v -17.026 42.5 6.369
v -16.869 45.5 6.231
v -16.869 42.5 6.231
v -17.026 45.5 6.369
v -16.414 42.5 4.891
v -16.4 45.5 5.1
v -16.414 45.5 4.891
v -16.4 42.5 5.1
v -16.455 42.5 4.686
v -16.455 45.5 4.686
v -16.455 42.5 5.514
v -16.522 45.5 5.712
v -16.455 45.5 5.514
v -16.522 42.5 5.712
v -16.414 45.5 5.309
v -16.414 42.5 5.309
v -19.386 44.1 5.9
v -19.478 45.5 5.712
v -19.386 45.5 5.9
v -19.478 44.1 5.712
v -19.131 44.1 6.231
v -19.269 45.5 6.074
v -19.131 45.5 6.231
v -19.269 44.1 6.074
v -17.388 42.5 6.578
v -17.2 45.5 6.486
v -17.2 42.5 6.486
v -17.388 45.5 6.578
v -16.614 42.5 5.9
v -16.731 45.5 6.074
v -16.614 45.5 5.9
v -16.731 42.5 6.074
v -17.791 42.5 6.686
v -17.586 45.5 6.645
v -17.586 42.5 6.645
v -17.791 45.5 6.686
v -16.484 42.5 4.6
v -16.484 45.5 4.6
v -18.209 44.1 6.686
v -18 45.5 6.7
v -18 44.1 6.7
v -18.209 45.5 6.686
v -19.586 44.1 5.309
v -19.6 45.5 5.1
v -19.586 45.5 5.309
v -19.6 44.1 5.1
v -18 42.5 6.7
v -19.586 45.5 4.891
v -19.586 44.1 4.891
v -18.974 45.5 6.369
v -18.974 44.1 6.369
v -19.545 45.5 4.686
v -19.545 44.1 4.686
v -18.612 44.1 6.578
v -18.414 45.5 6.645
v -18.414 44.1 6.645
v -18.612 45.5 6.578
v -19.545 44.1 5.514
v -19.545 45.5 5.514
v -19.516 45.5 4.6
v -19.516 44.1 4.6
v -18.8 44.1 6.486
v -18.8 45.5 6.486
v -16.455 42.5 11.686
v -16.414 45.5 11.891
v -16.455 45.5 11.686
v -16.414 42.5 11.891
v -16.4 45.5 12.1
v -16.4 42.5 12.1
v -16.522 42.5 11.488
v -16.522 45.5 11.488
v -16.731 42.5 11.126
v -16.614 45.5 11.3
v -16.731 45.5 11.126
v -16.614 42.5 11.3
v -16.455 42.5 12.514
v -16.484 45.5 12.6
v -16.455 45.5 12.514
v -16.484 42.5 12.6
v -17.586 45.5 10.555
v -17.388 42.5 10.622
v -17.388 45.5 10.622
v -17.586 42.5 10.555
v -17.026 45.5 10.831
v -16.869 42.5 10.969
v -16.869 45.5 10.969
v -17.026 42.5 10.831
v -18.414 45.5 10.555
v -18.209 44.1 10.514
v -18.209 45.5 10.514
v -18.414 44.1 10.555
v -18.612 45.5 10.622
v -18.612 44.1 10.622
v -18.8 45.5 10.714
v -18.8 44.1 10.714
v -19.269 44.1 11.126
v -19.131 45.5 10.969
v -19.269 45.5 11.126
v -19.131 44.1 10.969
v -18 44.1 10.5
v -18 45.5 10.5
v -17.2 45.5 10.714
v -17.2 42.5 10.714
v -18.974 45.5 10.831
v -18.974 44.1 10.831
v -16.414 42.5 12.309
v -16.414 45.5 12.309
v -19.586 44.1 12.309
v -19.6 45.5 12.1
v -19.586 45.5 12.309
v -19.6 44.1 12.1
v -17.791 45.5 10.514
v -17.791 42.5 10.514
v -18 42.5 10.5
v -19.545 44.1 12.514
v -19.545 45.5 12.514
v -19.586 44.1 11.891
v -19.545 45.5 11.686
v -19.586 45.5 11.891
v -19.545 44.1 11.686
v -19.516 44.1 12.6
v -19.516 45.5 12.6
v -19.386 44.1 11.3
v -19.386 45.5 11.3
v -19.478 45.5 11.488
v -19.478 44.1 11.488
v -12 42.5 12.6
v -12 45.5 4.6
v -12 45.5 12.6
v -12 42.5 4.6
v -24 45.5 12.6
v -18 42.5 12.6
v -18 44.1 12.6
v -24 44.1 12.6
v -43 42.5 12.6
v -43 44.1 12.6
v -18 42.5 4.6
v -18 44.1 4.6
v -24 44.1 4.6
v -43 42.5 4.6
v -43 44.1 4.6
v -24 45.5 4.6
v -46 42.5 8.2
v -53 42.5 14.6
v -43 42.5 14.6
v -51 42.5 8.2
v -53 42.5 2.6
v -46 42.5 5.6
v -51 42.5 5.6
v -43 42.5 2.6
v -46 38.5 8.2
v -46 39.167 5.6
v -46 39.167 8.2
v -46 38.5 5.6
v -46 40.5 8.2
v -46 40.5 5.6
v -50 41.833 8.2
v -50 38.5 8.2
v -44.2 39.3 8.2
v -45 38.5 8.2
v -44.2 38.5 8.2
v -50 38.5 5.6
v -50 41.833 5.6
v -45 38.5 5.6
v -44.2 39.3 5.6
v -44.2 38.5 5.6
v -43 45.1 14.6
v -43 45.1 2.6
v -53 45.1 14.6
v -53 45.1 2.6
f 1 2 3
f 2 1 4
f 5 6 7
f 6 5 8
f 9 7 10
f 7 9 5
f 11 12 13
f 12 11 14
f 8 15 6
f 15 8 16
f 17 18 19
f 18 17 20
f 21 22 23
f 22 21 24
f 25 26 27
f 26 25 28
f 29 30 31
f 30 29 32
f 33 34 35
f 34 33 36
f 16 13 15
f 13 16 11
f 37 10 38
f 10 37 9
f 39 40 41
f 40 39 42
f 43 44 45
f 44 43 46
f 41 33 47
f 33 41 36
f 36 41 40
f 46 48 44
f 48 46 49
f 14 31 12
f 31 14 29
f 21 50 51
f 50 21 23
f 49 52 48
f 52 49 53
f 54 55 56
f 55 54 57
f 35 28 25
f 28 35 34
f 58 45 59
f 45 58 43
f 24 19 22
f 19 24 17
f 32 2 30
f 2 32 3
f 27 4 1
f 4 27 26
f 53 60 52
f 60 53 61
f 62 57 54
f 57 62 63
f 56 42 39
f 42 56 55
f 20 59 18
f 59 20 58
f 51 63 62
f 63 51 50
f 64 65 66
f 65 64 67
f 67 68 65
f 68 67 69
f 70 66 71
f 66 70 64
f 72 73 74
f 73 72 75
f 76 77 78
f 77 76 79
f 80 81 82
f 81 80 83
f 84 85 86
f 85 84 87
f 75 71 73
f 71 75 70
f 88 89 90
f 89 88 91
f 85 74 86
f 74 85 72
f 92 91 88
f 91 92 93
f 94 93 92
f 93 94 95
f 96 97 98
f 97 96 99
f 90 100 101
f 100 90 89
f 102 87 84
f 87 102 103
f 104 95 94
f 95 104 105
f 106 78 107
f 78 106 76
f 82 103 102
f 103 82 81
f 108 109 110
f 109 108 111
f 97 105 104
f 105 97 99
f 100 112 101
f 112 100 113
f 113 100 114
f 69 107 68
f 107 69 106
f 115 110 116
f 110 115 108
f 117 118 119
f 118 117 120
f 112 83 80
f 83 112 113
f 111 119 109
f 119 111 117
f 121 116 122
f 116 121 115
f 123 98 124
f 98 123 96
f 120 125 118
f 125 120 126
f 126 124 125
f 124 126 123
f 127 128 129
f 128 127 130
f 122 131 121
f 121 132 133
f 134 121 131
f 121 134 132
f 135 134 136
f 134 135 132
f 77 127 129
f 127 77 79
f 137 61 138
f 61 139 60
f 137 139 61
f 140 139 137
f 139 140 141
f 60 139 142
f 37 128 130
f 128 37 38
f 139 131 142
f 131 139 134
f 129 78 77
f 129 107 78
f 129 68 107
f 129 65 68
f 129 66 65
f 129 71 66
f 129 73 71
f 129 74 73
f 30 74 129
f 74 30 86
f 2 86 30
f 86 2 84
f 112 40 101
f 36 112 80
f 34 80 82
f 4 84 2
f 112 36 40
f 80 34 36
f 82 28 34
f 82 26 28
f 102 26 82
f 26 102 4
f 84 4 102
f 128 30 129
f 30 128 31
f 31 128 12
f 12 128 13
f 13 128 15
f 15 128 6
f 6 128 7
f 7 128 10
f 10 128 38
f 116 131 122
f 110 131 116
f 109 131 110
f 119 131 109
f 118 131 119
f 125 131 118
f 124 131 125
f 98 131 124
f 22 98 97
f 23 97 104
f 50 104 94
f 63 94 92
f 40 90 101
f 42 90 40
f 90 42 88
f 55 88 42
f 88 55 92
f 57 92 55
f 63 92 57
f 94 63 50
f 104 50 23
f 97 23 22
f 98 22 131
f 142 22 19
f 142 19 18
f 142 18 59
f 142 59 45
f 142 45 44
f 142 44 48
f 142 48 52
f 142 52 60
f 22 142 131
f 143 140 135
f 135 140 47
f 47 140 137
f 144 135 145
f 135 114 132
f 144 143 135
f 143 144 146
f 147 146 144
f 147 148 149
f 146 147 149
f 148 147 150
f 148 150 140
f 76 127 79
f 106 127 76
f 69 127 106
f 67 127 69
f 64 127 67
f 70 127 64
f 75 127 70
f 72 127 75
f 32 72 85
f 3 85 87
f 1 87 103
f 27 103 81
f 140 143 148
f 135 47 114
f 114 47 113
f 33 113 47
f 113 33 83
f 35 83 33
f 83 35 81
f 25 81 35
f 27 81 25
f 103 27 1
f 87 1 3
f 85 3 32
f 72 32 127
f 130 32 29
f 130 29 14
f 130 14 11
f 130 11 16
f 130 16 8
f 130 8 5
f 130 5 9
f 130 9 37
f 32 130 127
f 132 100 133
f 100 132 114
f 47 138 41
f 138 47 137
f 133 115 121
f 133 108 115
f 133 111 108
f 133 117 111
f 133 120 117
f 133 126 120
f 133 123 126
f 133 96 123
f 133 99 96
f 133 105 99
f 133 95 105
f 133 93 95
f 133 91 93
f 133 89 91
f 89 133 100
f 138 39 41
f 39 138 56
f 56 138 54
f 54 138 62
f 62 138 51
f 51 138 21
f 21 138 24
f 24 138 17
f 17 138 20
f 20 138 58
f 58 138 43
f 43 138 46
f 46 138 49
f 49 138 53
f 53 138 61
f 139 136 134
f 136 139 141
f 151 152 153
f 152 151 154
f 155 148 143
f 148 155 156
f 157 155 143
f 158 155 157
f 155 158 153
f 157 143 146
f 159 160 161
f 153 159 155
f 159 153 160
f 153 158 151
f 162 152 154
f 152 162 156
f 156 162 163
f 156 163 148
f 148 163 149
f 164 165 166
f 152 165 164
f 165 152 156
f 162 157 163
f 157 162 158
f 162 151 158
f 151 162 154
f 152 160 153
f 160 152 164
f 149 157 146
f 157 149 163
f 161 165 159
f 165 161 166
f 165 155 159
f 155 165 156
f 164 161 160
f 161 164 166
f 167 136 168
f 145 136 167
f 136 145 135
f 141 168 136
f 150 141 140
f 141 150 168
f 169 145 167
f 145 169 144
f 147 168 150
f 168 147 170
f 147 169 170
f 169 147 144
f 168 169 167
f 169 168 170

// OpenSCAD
// file: psu_mount_common.scad
// Shared geometry for issue #166 PSU mounting experiments.
//
// This file models the PSU adapter in a LOCAL coordinate system centred on the
// six accessory bosses selected from the current universal backplane.
//
// Current master interface (PR #164):
//   absolute X = 80 / 176 mm
//   absolute Y = 62.5 / 86.5 / 110.5 mm
//
// Local adapter coordinates:
//   X = -48 / +48 mm
//   Y = -24 / 0 / +24 mm
//
// The backplane bosses are 7 mm OD x 4 mm high with 3.4 mm blind holes.
// The adapter uses shallow underside pockets around the boss bodies so that the
// plate positively registers on the boss grid instead of being positioned only
// by loose screw clearance.
//
// IMPORTANT: the PSU mounting-hole coordinates below remain placeholders until
// the real PSU has been measured.

$fn = 48;

// Documented PSU outer envelope.
psu_w = 110;
psu_h = 80;
psu_d = 37;

// Fit allowances.
psu_xy_clearance = 0.6;
plate_t = 3.2;
support_gap = 2.0;
wall_t = 2.4;
rail_h = 7.0;
lip_t = 1.6;
lip_inset = 1.8;

// Current six-boss accessory interface, local to its centre.
backplane_mount_x = [-48, 48];
backplane_mount_y = [-24, 0, 24];

backplane_boss_d = 7.0;
backplane_boss_h = 4.0;
backplane_boss_hole_d = 3.4;

// Adapter-side registration and screw clearance.
// 7.5 mm gives 0.25 mm radial clearance around the 7 mm PETG boss.
boss_pocket_d = 7.5;
boss_pocket_depth = 1.2;
adapter_screw_clearance_d = 3.6;

// Recess the M3 head/washer slightly on the equipment-facing side. Apart from
// making the fixing points obvious in the model, this keeps the screw head out
// of the PSU support plane.
adapter_screw_head_d = 7.0;
adapter_screw_head_depth = 0.8;

// Experimental PSU underside/back mounting points.
// Replace after measuring the real PSU.
psu_rear_mount_points = [
    [-42, -27],
    [ 42,  27]
];
psu_mount_pilot_d = 2.8;
psu_mount_boss_d = 8.0;

// Adapter footprint. 118 x 82 mm contains the 110 x 80 mm PSU envelope while
// fitting around the current 96 x 48 mm six-boss grid.
adapter_w = 118;
adapter_h = 82;
corner_r = 3;

module rounded_plate(w=adapter_w, h=adapter_h, t=plate_t, r=corner_r) {
    linear_extrude(height=t)
        offset(r=r)
            square([w-2*r, h-2*r], center=true);
}

module backplane_interface_cutters(t=plate_t, extra=0.6) {
    for (xx = backplane_mount_x)
        for (yy = backplane_mount_y) {
            // M3 screw clearance through the adapter.
            translate([xx, yy, -extra/2])
                cylinder(d=adapter_screw_clearance_d, h=t+extra);

            // Visible equipment-side recess for the M3 screw head/washer.
            translate([xx, yy, t-adapter_screw_head_depth])
                cylinder(
                    d=adapter_screw_head_d,
                    h=adapter_screw_head_depth+extra/2
                );

            // Shallow socket on the BACK face of the adapter. The 7 mm boss
            // enters this pocket and provides positive X/Y registration.
            translate([xx, yy, -0.1])
                cylinder(d=boss_pocket_d, h=boss_pocket_depth+0.1);
        }
}

// Compatibility name retained for the experimental service tray.
module backplane_hole_cutters(t=plate_t, extra=0.6) {
    backplane_interface_cutters(t=t, extra=extra);
}

module psu_mount_pilot_cutters(t=plate_t, extra=0.6) {
    for (pt = psu_rear_mount_points)
        translate([pt[0], pt[1], -extra/2])
            cylinder(d=psu_mount_pilot_d, h=t+extra);
}

module base_adapter_plate(include_psu_pilots=false, w=adapter_w, h=adapter_h) {
    difference() {
        rounded_plate(w=w, h=h);
        backplane_interface_cutters(t=plate_t);
        if (include_psu_pilots)
            psu_mount_pilot_cutters();
    }
}

support_rail_x = 34;
support_rail_w = 5;

module integrated_support_rails(length=psu_h-12) {
    // Keep the support rails well inboard of the X=+/-48 enclosure fixing
    // columns. The earlier +/-45 rail position partially refilled all six
    // screw holes after the plate was cut.
    assert(
        support_rail_x + support_rail_w/2 <
            abs(backplane_mount_x[0]) - adapter_screw_head_d/2 - 0.5,
        "PSU support rails overlap enclosure screw access"
    );

    for (xx = [-support_rail_x, support_rail_x])
        translate([xx-support_rail_w/2, -length/2, plate_t-0.2])
            cube([support_rail_w, length, support_gap+0.2]);
}

module raised_psu_mount_bosses(base_z=plate_t, h=support_gap) {
    // Two integral screw bosses support the PSU at exactly the same Z height
    // as the airflow rails. This avoids pulling the PSU down toward the plate
    // when the mounting screws are tightened.
    for (pt = psu_rear_mount_points)
        difference() {
            translate([pt[0], pt[1], base_z-0.2])
                cylinder(d=psu_mount_boss_d, h=h+0.2);
            translate([pt[0], pt[1], base_z-0.4])
                cylinder(d=psu_mount_pilot_d, h=h+0.6);
        }
}

module backplane_interface_preview() {
    // In the assembled position the boss tip enters the adapter by
    // boss_pocket_depth, so the backplane wall sits this far behind z=0.
    wall_z = -(backplane_boss_h - boss_pocket_depth);

    // Small transparent patch of the actual backplane mounting surface.
    %translate([-adapter_w/2, -adapter_h/2, wall_z-3])
        cube([adapter_w, adapter_h, 3]);

    // All six bosses are shown at the current master spacing.
    for (xx = backplane_mount_x)
        for (yy = backplane_mount_y)
            %translate([xx, yy, wall_z])
                difference() {
                    cylinder(d=backplane_boss_d, h=backplane_boss_h);
                    translate([0,0,-0.1])
                        cylinder(d=backplane_boss_hole_d,
                                 h=backplane_boss_h+0.2);
                }
}

// Backwards-compatible preview name used by the initial option files.
module backplane_boss_preview() {
    backplane_interface_preview();
}

module corner_locators(h=5, arm=10, t=2.2) {
    for (sx=[-1,1], sy=[-1,1]) {
        x = sx*(psu_w/2 + psu_xy_clearance);
        y = sy*(psu_h/2 + psu_xy_clearance);

        translate([
            x - (sx < 0 ? t : 0),
            y - (sy < 0 ? arm : 0),
            plate_t-0.2
        ])
            cube([t, arm,h+0.2]);

        translate([
            x - (sx < 0 ? arm : 0),
            y - (sy < 0 ? t : 0),
            plate_t-0.2
        ])
            cube([arm,t,h+0.2]);
    }
}
// main file
// Printable replaceable cantilever latch for the selected PSU service tray.
include <service_tray_snap_latch_common.scad>;

replaceable_snap_latch();
